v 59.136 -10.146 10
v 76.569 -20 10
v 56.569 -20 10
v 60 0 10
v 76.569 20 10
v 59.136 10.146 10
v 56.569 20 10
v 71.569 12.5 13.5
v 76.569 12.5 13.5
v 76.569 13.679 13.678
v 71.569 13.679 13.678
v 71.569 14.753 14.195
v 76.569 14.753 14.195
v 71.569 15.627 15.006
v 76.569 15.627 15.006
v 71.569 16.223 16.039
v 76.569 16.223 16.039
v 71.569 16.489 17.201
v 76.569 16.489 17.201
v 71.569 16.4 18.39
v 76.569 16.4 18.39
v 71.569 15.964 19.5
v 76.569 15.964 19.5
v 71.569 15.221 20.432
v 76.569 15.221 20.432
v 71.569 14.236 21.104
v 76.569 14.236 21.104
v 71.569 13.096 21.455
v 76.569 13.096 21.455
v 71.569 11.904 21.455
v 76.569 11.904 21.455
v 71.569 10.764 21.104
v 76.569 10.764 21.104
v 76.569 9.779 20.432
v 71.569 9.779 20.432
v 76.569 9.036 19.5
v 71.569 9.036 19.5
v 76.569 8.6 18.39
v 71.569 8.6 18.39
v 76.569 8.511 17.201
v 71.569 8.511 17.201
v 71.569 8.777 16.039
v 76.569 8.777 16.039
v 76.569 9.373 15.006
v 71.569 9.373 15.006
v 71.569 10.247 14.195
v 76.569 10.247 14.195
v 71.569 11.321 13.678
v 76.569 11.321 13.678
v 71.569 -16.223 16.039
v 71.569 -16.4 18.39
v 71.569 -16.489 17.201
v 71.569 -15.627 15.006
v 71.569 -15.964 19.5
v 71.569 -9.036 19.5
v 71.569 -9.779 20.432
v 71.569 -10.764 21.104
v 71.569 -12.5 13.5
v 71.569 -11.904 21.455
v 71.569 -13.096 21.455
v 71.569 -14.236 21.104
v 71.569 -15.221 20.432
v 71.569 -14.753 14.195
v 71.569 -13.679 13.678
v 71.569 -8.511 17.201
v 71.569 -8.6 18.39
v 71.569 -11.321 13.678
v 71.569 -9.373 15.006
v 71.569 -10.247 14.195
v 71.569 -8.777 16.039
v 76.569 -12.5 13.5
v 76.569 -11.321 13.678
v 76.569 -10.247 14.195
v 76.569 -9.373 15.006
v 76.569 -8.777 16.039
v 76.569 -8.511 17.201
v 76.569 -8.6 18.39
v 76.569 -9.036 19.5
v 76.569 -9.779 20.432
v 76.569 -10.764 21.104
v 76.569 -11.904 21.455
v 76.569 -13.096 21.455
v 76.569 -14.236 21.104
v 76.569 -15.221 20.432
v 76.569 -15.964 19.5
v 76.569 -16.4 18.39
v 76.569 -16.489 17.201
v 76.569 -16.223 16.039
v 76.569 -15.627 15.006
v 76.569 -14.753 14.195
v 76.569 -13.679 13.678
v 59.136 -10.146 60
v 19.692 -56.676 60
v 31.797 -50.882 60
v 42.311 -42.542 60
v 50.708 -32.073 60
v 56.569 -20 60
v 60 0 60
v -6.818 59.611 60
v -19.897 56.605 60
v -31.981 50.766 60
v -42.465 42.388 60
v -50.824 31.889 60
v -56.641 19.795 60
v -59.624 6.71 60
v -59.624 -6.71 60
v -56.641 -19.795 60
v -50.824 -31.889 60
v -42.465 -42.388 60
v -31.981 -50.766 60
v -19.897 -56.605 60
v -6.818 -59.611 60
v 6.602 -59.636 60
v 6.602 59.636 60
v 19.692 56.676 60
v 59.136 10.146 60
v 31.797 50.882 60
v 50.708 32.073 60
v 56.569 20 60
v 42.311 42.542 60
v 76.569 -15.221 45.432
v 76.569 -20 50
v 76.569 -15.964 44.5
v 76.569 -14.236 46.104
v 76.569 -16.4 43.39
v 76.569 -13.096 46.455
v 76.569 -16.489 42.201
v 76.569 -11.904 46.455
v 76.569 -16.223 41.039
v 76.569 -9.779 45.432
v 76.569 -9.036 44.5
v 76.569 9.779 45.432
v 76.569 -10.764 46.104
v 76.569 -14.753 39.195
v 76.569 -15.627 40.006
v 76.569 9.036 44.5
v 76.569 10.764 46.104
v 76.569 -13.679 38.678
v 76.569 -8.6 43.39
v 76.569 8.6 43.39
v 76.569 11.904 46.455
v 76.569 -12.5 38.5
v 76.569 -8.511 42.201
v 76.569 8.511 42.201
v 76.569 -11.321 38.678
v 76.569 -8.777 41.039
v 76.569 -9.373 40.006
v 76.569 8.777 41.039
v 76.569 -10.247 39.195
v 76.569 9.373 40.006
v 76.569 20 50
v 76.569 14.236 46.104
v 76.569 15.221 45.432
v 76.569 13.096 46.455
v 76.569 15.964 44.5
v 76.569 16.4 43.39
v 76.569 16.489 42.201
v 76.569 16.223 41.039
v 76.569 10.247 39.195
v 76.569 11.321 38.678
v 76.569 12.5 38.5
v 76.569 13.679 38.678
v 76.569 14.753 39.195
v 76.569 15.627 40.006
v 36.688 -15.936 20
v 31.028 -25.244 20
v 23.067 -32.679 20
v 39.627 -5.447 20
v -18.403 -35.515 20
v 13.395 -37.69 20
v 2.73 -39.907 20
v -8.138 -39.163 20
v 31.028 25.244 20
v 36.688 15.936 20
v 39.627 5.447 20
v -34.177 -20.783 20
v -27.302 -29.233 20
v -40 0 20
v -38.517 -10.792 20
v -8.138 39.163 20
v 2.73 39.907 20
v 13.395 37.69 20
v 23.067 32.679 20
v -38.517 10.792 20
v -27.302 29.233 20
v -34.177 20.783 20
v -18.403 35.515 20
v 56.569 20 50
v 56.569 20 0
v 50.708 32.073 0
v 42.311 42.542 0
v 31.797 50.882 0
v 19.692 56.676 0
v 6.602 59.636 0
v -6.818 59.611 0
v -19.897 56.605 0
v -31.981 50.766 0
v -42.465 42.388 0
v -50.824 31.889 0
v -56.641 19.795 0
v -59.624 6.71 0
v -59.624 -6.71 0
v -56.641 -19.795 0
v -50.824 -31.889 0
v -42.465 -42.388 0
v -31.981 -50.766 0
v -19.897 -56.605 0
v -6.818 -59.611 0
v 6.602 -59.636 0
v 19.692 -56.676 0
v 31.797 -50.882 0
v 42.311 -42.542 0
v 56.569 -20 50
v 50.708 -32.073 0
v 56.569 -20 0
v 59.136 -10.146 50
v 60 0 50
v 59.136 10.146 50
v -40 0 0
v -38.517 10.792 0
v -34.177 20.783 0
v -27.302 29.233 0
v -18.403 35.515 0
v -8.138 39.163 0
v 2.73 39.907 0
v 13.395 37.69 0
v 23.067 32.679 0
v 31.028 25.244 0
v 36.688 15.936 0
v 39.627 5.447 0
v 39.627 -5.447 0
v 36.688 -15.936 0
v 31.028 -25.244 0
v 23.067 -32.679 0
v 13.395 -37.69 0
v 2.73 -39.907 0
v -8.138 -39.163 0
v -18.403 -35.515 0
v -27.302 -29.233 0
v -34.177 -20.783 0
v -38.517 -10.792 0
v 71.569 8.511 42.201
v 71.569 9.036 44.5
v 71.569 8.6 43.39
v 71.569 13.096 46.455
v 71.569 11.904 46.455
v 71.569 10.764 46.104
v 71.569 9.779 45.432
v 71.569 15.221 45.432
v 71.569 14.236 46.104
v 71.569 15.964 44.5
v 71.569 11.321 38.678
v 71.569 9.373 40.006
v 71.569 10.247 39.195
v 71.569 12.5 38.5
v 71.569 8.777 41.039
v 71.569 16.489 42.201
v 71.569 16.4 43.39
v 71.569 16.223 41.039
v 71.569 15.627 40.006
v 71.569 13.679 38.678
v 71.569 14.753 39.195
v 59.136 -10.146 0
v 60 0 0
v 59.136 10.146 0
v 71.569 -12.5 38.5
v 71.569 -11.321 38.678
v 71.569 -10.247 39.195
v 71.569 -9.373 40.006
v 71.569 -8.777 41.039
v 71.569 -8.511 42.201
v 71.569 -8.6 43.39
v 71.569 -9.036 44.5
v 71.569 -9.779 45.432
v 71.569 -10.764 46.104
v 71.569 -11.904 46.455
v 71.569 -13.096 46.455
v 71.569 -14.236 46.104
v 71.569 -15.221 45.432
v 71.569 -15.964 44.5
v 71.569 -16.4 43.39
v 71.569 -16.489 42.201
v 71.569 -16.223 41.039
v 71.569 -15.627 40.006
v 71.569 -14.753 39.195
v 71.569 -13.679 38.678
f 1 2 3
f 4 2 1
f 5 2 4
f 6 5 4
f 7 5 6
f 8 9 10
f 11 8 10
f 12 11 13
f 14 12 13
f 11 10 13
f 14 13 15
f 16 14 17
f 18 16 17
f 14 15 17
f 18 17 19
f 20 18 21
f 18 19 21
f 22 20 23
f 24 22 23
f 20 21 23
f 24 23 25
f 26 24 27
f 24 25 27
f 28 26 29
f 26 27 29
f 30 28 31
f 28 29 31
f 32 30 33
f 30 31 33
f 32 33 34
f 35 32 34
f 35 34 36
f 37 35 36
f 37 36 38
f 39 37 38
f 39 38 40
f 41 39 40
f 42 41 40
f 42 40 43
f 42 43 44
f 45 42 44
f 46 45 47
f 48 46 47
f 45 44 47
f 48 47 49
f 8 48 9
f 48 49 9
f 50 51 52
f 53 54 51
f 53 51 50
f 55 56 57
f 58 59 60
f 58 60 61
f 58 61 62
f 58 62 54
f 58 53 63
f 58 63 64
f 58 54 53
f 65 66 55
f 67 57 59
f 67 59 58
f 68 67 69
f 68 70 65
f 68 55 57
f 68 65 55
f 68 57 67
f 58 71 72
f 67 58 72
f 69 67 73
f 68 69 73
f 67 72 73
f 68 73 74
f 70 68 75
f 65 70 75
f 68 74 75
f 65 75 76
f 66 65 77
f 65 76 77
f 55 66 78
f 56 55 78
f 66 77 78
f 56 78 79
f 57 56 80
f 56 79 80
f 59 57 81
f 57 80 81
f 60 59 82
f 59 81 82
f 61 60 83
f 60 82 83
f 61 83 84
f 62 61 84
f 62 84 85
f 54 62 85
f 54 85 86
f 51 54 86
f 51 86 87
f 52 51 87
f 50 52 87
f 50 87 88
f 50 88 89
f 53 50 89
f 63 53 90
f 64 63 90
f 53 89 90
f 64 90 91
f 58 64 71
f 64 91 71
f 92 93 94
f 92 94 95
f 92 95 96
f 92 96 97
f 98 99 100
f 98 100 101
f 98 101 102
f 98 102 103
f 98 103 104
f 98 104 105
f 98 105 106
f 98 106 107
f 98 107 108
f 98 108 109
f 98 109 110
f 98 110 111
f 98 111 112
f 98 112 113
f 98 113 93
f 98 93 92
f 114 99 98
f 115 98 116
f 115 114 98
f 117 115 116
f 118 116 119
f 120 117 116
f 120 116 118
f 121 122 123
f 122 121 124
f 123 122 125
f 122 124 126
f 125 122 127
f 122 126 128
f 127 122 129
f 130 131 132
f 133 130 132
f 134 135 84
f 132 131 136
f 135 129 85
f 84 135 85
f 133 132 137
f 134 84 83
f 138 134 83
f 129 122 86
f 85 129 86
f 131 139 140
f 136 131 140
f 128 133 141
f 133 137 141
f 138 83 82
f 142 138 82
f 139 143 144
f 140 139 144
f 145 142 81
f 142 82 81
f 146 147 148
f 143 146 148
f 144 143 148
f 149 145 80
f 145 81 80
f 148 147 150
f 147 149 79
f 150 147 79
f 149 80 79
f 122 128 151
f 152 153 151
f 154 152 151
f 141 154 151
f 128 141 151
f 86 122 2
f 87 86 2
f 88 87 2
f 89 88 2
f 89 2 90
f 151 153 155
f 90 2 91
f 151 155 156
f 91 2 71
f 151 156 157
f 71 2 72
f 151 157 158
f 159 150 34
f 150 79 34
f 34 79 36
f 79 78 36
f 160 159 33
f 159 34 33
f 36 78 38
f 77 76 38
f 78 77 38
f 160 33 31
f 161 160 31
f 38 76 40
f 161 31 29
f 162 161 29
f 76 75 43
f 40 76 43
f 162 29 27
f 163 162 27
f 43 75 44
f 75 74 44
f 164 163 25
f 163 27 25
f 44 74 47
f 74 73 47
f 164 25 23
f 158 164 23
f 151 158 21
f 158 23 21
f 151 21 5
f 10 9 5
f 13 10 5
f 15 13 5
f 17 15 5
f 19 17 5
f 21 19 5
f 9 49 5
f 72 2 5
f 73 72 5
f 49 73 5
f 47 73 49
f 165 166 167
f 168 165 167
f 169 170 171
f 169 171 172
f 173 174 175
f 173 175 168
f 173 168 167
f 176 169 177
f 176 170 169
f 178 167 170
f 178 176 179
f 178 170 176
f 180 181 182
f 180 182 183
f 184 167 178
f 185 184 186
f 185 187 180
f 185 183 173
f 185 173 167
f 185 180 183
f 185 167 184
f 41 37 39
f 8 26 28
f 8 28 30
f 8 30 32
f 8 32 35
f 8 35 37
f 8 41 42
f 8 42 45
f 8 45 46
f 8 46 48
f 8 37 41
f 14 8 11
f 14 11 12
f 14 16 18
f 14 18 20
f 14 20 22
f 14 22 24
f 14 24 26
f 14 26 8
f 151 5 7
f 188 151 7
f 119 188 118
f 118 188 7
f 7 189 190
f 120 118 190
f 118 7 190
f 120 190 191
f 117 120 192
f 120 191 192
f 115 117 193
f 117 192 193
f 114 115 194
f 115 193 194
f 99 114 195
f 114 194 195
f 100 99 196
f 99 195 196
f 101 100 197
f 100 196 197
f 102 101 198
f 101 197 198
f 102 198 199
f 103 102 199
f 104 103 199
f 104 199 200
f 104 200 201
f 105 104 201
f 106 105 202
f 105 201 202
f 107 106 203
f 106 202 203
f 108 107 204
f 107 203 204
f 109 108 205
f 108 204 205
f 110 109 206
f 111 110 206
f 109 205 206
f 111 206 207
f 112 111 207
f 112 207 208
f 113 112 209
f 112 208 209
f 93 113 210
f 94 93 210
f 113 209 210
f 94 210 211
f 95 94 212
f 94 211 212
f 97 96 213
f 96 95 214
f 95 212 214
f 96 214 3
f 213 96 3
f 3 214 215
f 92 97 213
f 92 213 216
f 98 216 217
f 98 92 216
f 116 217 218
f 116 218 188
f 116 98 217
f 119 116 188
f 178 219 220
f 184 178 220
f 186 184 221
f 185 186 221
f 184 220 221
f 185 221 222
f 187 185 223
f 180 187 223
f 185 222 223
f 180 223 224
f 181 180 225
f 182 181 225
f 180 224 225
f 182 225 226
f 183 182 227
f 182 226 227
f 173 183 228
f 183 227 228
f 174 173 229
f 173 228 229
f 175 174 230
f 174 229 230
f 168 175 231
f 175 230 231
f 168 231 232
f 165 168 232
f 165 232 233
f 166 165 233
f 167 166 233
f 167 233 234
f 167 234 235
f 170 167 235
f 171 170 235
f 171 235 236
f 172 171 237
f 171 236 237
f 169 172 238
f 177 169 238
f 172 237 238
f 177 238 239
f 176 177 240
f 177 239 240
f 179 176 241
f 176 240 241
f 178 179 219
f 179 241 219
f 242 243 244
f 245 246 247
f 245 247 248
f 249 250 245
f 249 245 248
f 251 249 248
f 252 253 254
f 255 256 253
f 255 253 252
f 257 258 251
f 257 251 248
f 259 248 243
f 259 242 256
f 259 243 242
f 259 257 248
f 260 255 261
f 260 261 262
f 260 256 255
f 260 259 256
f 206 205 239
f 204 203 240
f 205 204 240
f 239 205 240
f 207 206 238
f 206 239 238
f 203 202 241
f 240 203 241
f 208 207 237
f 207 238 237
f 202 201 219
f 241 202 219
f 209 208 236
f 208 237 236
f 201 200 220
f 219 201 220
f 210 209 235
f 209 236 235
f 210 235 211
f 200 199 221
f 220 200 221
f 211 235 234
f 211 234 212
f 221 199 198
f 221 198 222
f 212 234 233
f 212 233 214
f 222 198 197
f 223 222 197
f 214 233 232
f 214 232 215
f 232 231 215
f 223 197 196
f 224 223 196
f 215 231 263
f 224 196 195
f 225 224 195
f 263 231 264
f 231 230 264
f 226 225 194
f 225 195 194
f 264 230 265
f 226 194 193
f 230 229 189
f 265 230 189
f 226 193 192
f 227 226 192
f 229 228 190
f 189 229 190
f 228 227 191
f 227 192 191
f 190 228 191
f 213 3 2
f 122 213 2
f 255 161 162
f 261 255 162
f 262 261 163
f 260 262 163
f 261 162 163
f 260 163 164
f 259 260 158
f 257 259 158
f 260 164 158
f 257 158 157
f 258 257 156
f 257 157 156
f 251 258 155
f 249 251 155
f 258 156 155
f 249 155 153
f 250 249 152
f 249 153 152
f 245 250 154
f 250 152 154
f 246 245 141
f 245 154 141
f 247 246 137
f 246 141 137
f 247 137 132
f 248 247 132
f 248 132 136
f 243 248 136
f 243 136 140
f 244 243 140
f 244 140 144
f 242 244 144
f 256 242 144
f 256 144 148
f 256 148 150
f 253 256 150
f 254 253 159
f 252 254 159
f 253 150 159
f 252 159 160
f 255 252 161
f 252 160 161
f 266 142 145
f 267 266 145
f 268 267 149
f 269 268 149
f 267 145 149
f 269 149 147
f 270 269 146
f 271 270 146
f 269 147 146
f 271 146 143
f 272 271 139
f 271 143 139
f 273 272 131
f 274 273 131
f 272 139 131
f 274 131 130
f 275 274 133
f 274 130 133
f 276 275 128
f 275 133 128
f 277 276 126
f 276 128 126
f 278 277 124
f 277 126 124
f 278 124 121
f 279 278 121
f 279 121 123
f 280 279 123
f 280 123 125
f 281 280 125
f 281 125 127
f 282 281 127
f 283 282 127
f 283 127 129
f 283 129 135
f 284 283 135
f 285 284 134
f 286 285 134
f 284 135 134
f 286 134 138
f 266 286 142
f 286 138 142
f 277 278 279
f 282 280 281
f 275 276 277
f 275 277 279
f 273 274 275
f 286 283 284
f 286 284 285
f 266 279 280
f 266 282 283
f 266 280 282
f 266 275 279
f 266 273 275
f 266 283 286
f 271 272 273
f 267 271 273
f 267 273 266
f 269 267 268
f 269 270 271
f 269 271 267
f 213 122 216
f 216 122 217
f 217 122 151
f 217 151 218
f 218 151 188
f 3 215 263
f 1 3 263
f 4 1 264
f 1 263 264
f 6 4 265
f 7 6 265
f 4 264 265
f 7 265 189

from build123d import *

# Parameters (mm, degrees)
EXTRUDE_1_DEPTH     = 60
CUT_EXTRUDE_1_DEPTH = 10
CUT_EXTRUDE_2_DEPTH = 10
SKETCH_4_R          = 40
CUT_EXTRUDE_3_DEPTH = 20
SKETCH_5_R          = 4
CUT_EXTRUDE_4_DEPTH = 5


with BuildPart() as part:
    # 草图1 → 凸台-拉伸1 (new body)
    with BuildSketch(Plane.XY):
        with BuildLine():
            Line((56.568542495, -20), (76.568542495, -20))
            Line((76.568542495, -20), (76.568542495, 20))
            Line((76.568542495, 20), (56.568542495, 20))
            ThreePointArc((56.568542495, 20), (-60, 0), (56.568542495, -20))
        make_face()
    extrude(amount=EXTRUDE_1_DEPTH)

    # 草图2 → 切除-拉伸1 (cut)
    with BuildSketch(Plane(origin=(0, 0, 0), x_dir=(-1, 0, 0), z_dir=(0, 0, -1))):
        with BuildLine():
            Line((-76.568542495, 20), (-76.568542495, -20))
            Line((-76.568542495, -20), (-56.568542495, -20))
            ThreePointArc((-56.568542495, -20), (-60, 0), (-56.568542495, 20))
            Line((-56.568542495, 20), (-76.568542495, 20))
        make_face()
    extrude(amount=-CUT_EXTRUDE_1_DEPTH, mode=Mode.SUBTRACT)

    # 草图3 → 切除-拉伸2 (cut)
    with BuildSketch(Plane.XY.offset(60)):
        with BuildLine():
            Line((76.568542495, 20), (76.568542495, -20))
            Line((76.568542495, -20), (56.568542495, -20))
            ThreePointArc((56.568542495, -20), (60, 0), (56.568542495, 20))
            Line((56.568542495, 20), (76.568542495, 20))
        make_face()
    extrude(amount=-CUT_EXTRUDE_2_DEPTH, mode=Mode.SUBTRACT)

    # 草图4 → 切除-拉伸3 (cut)
    with BuildSketch(Plane(origin=(0, 0, 0), x_dir=(-1, 0, 0), z_dir=(0, 0, -1))):
        Circle(SKETCH_4_R)
    extrude(amount=-CUT_EXTRUDE_3_DEPTH, mode=Mode.SUBTRACT)

    # 草图5 → 切除-拉伸4 (cut)
    with BuildSketch(Plane(origin=(76.568542495, 0, 0), x_dir=(0, 0, -1), z_dir=(1, 0, 0))):
        with Locations((-17.5, 12.5)):
            Circle(SKETCH_5_R)
        with Locations((-17.5, -12.5)):
            Circle(SKETCH_5_R)
        with Locations((-42.5, -12.5)):
            Circle(SKETCH_5_R)
        with Locations((-42.5, 12.5)):
            Circle(SKETCH_5_R)
    extrude(amount=-CUT_EXTRUDE_4_DEPTH, mode=Mode.SUBTRACT)


solid = part.part
